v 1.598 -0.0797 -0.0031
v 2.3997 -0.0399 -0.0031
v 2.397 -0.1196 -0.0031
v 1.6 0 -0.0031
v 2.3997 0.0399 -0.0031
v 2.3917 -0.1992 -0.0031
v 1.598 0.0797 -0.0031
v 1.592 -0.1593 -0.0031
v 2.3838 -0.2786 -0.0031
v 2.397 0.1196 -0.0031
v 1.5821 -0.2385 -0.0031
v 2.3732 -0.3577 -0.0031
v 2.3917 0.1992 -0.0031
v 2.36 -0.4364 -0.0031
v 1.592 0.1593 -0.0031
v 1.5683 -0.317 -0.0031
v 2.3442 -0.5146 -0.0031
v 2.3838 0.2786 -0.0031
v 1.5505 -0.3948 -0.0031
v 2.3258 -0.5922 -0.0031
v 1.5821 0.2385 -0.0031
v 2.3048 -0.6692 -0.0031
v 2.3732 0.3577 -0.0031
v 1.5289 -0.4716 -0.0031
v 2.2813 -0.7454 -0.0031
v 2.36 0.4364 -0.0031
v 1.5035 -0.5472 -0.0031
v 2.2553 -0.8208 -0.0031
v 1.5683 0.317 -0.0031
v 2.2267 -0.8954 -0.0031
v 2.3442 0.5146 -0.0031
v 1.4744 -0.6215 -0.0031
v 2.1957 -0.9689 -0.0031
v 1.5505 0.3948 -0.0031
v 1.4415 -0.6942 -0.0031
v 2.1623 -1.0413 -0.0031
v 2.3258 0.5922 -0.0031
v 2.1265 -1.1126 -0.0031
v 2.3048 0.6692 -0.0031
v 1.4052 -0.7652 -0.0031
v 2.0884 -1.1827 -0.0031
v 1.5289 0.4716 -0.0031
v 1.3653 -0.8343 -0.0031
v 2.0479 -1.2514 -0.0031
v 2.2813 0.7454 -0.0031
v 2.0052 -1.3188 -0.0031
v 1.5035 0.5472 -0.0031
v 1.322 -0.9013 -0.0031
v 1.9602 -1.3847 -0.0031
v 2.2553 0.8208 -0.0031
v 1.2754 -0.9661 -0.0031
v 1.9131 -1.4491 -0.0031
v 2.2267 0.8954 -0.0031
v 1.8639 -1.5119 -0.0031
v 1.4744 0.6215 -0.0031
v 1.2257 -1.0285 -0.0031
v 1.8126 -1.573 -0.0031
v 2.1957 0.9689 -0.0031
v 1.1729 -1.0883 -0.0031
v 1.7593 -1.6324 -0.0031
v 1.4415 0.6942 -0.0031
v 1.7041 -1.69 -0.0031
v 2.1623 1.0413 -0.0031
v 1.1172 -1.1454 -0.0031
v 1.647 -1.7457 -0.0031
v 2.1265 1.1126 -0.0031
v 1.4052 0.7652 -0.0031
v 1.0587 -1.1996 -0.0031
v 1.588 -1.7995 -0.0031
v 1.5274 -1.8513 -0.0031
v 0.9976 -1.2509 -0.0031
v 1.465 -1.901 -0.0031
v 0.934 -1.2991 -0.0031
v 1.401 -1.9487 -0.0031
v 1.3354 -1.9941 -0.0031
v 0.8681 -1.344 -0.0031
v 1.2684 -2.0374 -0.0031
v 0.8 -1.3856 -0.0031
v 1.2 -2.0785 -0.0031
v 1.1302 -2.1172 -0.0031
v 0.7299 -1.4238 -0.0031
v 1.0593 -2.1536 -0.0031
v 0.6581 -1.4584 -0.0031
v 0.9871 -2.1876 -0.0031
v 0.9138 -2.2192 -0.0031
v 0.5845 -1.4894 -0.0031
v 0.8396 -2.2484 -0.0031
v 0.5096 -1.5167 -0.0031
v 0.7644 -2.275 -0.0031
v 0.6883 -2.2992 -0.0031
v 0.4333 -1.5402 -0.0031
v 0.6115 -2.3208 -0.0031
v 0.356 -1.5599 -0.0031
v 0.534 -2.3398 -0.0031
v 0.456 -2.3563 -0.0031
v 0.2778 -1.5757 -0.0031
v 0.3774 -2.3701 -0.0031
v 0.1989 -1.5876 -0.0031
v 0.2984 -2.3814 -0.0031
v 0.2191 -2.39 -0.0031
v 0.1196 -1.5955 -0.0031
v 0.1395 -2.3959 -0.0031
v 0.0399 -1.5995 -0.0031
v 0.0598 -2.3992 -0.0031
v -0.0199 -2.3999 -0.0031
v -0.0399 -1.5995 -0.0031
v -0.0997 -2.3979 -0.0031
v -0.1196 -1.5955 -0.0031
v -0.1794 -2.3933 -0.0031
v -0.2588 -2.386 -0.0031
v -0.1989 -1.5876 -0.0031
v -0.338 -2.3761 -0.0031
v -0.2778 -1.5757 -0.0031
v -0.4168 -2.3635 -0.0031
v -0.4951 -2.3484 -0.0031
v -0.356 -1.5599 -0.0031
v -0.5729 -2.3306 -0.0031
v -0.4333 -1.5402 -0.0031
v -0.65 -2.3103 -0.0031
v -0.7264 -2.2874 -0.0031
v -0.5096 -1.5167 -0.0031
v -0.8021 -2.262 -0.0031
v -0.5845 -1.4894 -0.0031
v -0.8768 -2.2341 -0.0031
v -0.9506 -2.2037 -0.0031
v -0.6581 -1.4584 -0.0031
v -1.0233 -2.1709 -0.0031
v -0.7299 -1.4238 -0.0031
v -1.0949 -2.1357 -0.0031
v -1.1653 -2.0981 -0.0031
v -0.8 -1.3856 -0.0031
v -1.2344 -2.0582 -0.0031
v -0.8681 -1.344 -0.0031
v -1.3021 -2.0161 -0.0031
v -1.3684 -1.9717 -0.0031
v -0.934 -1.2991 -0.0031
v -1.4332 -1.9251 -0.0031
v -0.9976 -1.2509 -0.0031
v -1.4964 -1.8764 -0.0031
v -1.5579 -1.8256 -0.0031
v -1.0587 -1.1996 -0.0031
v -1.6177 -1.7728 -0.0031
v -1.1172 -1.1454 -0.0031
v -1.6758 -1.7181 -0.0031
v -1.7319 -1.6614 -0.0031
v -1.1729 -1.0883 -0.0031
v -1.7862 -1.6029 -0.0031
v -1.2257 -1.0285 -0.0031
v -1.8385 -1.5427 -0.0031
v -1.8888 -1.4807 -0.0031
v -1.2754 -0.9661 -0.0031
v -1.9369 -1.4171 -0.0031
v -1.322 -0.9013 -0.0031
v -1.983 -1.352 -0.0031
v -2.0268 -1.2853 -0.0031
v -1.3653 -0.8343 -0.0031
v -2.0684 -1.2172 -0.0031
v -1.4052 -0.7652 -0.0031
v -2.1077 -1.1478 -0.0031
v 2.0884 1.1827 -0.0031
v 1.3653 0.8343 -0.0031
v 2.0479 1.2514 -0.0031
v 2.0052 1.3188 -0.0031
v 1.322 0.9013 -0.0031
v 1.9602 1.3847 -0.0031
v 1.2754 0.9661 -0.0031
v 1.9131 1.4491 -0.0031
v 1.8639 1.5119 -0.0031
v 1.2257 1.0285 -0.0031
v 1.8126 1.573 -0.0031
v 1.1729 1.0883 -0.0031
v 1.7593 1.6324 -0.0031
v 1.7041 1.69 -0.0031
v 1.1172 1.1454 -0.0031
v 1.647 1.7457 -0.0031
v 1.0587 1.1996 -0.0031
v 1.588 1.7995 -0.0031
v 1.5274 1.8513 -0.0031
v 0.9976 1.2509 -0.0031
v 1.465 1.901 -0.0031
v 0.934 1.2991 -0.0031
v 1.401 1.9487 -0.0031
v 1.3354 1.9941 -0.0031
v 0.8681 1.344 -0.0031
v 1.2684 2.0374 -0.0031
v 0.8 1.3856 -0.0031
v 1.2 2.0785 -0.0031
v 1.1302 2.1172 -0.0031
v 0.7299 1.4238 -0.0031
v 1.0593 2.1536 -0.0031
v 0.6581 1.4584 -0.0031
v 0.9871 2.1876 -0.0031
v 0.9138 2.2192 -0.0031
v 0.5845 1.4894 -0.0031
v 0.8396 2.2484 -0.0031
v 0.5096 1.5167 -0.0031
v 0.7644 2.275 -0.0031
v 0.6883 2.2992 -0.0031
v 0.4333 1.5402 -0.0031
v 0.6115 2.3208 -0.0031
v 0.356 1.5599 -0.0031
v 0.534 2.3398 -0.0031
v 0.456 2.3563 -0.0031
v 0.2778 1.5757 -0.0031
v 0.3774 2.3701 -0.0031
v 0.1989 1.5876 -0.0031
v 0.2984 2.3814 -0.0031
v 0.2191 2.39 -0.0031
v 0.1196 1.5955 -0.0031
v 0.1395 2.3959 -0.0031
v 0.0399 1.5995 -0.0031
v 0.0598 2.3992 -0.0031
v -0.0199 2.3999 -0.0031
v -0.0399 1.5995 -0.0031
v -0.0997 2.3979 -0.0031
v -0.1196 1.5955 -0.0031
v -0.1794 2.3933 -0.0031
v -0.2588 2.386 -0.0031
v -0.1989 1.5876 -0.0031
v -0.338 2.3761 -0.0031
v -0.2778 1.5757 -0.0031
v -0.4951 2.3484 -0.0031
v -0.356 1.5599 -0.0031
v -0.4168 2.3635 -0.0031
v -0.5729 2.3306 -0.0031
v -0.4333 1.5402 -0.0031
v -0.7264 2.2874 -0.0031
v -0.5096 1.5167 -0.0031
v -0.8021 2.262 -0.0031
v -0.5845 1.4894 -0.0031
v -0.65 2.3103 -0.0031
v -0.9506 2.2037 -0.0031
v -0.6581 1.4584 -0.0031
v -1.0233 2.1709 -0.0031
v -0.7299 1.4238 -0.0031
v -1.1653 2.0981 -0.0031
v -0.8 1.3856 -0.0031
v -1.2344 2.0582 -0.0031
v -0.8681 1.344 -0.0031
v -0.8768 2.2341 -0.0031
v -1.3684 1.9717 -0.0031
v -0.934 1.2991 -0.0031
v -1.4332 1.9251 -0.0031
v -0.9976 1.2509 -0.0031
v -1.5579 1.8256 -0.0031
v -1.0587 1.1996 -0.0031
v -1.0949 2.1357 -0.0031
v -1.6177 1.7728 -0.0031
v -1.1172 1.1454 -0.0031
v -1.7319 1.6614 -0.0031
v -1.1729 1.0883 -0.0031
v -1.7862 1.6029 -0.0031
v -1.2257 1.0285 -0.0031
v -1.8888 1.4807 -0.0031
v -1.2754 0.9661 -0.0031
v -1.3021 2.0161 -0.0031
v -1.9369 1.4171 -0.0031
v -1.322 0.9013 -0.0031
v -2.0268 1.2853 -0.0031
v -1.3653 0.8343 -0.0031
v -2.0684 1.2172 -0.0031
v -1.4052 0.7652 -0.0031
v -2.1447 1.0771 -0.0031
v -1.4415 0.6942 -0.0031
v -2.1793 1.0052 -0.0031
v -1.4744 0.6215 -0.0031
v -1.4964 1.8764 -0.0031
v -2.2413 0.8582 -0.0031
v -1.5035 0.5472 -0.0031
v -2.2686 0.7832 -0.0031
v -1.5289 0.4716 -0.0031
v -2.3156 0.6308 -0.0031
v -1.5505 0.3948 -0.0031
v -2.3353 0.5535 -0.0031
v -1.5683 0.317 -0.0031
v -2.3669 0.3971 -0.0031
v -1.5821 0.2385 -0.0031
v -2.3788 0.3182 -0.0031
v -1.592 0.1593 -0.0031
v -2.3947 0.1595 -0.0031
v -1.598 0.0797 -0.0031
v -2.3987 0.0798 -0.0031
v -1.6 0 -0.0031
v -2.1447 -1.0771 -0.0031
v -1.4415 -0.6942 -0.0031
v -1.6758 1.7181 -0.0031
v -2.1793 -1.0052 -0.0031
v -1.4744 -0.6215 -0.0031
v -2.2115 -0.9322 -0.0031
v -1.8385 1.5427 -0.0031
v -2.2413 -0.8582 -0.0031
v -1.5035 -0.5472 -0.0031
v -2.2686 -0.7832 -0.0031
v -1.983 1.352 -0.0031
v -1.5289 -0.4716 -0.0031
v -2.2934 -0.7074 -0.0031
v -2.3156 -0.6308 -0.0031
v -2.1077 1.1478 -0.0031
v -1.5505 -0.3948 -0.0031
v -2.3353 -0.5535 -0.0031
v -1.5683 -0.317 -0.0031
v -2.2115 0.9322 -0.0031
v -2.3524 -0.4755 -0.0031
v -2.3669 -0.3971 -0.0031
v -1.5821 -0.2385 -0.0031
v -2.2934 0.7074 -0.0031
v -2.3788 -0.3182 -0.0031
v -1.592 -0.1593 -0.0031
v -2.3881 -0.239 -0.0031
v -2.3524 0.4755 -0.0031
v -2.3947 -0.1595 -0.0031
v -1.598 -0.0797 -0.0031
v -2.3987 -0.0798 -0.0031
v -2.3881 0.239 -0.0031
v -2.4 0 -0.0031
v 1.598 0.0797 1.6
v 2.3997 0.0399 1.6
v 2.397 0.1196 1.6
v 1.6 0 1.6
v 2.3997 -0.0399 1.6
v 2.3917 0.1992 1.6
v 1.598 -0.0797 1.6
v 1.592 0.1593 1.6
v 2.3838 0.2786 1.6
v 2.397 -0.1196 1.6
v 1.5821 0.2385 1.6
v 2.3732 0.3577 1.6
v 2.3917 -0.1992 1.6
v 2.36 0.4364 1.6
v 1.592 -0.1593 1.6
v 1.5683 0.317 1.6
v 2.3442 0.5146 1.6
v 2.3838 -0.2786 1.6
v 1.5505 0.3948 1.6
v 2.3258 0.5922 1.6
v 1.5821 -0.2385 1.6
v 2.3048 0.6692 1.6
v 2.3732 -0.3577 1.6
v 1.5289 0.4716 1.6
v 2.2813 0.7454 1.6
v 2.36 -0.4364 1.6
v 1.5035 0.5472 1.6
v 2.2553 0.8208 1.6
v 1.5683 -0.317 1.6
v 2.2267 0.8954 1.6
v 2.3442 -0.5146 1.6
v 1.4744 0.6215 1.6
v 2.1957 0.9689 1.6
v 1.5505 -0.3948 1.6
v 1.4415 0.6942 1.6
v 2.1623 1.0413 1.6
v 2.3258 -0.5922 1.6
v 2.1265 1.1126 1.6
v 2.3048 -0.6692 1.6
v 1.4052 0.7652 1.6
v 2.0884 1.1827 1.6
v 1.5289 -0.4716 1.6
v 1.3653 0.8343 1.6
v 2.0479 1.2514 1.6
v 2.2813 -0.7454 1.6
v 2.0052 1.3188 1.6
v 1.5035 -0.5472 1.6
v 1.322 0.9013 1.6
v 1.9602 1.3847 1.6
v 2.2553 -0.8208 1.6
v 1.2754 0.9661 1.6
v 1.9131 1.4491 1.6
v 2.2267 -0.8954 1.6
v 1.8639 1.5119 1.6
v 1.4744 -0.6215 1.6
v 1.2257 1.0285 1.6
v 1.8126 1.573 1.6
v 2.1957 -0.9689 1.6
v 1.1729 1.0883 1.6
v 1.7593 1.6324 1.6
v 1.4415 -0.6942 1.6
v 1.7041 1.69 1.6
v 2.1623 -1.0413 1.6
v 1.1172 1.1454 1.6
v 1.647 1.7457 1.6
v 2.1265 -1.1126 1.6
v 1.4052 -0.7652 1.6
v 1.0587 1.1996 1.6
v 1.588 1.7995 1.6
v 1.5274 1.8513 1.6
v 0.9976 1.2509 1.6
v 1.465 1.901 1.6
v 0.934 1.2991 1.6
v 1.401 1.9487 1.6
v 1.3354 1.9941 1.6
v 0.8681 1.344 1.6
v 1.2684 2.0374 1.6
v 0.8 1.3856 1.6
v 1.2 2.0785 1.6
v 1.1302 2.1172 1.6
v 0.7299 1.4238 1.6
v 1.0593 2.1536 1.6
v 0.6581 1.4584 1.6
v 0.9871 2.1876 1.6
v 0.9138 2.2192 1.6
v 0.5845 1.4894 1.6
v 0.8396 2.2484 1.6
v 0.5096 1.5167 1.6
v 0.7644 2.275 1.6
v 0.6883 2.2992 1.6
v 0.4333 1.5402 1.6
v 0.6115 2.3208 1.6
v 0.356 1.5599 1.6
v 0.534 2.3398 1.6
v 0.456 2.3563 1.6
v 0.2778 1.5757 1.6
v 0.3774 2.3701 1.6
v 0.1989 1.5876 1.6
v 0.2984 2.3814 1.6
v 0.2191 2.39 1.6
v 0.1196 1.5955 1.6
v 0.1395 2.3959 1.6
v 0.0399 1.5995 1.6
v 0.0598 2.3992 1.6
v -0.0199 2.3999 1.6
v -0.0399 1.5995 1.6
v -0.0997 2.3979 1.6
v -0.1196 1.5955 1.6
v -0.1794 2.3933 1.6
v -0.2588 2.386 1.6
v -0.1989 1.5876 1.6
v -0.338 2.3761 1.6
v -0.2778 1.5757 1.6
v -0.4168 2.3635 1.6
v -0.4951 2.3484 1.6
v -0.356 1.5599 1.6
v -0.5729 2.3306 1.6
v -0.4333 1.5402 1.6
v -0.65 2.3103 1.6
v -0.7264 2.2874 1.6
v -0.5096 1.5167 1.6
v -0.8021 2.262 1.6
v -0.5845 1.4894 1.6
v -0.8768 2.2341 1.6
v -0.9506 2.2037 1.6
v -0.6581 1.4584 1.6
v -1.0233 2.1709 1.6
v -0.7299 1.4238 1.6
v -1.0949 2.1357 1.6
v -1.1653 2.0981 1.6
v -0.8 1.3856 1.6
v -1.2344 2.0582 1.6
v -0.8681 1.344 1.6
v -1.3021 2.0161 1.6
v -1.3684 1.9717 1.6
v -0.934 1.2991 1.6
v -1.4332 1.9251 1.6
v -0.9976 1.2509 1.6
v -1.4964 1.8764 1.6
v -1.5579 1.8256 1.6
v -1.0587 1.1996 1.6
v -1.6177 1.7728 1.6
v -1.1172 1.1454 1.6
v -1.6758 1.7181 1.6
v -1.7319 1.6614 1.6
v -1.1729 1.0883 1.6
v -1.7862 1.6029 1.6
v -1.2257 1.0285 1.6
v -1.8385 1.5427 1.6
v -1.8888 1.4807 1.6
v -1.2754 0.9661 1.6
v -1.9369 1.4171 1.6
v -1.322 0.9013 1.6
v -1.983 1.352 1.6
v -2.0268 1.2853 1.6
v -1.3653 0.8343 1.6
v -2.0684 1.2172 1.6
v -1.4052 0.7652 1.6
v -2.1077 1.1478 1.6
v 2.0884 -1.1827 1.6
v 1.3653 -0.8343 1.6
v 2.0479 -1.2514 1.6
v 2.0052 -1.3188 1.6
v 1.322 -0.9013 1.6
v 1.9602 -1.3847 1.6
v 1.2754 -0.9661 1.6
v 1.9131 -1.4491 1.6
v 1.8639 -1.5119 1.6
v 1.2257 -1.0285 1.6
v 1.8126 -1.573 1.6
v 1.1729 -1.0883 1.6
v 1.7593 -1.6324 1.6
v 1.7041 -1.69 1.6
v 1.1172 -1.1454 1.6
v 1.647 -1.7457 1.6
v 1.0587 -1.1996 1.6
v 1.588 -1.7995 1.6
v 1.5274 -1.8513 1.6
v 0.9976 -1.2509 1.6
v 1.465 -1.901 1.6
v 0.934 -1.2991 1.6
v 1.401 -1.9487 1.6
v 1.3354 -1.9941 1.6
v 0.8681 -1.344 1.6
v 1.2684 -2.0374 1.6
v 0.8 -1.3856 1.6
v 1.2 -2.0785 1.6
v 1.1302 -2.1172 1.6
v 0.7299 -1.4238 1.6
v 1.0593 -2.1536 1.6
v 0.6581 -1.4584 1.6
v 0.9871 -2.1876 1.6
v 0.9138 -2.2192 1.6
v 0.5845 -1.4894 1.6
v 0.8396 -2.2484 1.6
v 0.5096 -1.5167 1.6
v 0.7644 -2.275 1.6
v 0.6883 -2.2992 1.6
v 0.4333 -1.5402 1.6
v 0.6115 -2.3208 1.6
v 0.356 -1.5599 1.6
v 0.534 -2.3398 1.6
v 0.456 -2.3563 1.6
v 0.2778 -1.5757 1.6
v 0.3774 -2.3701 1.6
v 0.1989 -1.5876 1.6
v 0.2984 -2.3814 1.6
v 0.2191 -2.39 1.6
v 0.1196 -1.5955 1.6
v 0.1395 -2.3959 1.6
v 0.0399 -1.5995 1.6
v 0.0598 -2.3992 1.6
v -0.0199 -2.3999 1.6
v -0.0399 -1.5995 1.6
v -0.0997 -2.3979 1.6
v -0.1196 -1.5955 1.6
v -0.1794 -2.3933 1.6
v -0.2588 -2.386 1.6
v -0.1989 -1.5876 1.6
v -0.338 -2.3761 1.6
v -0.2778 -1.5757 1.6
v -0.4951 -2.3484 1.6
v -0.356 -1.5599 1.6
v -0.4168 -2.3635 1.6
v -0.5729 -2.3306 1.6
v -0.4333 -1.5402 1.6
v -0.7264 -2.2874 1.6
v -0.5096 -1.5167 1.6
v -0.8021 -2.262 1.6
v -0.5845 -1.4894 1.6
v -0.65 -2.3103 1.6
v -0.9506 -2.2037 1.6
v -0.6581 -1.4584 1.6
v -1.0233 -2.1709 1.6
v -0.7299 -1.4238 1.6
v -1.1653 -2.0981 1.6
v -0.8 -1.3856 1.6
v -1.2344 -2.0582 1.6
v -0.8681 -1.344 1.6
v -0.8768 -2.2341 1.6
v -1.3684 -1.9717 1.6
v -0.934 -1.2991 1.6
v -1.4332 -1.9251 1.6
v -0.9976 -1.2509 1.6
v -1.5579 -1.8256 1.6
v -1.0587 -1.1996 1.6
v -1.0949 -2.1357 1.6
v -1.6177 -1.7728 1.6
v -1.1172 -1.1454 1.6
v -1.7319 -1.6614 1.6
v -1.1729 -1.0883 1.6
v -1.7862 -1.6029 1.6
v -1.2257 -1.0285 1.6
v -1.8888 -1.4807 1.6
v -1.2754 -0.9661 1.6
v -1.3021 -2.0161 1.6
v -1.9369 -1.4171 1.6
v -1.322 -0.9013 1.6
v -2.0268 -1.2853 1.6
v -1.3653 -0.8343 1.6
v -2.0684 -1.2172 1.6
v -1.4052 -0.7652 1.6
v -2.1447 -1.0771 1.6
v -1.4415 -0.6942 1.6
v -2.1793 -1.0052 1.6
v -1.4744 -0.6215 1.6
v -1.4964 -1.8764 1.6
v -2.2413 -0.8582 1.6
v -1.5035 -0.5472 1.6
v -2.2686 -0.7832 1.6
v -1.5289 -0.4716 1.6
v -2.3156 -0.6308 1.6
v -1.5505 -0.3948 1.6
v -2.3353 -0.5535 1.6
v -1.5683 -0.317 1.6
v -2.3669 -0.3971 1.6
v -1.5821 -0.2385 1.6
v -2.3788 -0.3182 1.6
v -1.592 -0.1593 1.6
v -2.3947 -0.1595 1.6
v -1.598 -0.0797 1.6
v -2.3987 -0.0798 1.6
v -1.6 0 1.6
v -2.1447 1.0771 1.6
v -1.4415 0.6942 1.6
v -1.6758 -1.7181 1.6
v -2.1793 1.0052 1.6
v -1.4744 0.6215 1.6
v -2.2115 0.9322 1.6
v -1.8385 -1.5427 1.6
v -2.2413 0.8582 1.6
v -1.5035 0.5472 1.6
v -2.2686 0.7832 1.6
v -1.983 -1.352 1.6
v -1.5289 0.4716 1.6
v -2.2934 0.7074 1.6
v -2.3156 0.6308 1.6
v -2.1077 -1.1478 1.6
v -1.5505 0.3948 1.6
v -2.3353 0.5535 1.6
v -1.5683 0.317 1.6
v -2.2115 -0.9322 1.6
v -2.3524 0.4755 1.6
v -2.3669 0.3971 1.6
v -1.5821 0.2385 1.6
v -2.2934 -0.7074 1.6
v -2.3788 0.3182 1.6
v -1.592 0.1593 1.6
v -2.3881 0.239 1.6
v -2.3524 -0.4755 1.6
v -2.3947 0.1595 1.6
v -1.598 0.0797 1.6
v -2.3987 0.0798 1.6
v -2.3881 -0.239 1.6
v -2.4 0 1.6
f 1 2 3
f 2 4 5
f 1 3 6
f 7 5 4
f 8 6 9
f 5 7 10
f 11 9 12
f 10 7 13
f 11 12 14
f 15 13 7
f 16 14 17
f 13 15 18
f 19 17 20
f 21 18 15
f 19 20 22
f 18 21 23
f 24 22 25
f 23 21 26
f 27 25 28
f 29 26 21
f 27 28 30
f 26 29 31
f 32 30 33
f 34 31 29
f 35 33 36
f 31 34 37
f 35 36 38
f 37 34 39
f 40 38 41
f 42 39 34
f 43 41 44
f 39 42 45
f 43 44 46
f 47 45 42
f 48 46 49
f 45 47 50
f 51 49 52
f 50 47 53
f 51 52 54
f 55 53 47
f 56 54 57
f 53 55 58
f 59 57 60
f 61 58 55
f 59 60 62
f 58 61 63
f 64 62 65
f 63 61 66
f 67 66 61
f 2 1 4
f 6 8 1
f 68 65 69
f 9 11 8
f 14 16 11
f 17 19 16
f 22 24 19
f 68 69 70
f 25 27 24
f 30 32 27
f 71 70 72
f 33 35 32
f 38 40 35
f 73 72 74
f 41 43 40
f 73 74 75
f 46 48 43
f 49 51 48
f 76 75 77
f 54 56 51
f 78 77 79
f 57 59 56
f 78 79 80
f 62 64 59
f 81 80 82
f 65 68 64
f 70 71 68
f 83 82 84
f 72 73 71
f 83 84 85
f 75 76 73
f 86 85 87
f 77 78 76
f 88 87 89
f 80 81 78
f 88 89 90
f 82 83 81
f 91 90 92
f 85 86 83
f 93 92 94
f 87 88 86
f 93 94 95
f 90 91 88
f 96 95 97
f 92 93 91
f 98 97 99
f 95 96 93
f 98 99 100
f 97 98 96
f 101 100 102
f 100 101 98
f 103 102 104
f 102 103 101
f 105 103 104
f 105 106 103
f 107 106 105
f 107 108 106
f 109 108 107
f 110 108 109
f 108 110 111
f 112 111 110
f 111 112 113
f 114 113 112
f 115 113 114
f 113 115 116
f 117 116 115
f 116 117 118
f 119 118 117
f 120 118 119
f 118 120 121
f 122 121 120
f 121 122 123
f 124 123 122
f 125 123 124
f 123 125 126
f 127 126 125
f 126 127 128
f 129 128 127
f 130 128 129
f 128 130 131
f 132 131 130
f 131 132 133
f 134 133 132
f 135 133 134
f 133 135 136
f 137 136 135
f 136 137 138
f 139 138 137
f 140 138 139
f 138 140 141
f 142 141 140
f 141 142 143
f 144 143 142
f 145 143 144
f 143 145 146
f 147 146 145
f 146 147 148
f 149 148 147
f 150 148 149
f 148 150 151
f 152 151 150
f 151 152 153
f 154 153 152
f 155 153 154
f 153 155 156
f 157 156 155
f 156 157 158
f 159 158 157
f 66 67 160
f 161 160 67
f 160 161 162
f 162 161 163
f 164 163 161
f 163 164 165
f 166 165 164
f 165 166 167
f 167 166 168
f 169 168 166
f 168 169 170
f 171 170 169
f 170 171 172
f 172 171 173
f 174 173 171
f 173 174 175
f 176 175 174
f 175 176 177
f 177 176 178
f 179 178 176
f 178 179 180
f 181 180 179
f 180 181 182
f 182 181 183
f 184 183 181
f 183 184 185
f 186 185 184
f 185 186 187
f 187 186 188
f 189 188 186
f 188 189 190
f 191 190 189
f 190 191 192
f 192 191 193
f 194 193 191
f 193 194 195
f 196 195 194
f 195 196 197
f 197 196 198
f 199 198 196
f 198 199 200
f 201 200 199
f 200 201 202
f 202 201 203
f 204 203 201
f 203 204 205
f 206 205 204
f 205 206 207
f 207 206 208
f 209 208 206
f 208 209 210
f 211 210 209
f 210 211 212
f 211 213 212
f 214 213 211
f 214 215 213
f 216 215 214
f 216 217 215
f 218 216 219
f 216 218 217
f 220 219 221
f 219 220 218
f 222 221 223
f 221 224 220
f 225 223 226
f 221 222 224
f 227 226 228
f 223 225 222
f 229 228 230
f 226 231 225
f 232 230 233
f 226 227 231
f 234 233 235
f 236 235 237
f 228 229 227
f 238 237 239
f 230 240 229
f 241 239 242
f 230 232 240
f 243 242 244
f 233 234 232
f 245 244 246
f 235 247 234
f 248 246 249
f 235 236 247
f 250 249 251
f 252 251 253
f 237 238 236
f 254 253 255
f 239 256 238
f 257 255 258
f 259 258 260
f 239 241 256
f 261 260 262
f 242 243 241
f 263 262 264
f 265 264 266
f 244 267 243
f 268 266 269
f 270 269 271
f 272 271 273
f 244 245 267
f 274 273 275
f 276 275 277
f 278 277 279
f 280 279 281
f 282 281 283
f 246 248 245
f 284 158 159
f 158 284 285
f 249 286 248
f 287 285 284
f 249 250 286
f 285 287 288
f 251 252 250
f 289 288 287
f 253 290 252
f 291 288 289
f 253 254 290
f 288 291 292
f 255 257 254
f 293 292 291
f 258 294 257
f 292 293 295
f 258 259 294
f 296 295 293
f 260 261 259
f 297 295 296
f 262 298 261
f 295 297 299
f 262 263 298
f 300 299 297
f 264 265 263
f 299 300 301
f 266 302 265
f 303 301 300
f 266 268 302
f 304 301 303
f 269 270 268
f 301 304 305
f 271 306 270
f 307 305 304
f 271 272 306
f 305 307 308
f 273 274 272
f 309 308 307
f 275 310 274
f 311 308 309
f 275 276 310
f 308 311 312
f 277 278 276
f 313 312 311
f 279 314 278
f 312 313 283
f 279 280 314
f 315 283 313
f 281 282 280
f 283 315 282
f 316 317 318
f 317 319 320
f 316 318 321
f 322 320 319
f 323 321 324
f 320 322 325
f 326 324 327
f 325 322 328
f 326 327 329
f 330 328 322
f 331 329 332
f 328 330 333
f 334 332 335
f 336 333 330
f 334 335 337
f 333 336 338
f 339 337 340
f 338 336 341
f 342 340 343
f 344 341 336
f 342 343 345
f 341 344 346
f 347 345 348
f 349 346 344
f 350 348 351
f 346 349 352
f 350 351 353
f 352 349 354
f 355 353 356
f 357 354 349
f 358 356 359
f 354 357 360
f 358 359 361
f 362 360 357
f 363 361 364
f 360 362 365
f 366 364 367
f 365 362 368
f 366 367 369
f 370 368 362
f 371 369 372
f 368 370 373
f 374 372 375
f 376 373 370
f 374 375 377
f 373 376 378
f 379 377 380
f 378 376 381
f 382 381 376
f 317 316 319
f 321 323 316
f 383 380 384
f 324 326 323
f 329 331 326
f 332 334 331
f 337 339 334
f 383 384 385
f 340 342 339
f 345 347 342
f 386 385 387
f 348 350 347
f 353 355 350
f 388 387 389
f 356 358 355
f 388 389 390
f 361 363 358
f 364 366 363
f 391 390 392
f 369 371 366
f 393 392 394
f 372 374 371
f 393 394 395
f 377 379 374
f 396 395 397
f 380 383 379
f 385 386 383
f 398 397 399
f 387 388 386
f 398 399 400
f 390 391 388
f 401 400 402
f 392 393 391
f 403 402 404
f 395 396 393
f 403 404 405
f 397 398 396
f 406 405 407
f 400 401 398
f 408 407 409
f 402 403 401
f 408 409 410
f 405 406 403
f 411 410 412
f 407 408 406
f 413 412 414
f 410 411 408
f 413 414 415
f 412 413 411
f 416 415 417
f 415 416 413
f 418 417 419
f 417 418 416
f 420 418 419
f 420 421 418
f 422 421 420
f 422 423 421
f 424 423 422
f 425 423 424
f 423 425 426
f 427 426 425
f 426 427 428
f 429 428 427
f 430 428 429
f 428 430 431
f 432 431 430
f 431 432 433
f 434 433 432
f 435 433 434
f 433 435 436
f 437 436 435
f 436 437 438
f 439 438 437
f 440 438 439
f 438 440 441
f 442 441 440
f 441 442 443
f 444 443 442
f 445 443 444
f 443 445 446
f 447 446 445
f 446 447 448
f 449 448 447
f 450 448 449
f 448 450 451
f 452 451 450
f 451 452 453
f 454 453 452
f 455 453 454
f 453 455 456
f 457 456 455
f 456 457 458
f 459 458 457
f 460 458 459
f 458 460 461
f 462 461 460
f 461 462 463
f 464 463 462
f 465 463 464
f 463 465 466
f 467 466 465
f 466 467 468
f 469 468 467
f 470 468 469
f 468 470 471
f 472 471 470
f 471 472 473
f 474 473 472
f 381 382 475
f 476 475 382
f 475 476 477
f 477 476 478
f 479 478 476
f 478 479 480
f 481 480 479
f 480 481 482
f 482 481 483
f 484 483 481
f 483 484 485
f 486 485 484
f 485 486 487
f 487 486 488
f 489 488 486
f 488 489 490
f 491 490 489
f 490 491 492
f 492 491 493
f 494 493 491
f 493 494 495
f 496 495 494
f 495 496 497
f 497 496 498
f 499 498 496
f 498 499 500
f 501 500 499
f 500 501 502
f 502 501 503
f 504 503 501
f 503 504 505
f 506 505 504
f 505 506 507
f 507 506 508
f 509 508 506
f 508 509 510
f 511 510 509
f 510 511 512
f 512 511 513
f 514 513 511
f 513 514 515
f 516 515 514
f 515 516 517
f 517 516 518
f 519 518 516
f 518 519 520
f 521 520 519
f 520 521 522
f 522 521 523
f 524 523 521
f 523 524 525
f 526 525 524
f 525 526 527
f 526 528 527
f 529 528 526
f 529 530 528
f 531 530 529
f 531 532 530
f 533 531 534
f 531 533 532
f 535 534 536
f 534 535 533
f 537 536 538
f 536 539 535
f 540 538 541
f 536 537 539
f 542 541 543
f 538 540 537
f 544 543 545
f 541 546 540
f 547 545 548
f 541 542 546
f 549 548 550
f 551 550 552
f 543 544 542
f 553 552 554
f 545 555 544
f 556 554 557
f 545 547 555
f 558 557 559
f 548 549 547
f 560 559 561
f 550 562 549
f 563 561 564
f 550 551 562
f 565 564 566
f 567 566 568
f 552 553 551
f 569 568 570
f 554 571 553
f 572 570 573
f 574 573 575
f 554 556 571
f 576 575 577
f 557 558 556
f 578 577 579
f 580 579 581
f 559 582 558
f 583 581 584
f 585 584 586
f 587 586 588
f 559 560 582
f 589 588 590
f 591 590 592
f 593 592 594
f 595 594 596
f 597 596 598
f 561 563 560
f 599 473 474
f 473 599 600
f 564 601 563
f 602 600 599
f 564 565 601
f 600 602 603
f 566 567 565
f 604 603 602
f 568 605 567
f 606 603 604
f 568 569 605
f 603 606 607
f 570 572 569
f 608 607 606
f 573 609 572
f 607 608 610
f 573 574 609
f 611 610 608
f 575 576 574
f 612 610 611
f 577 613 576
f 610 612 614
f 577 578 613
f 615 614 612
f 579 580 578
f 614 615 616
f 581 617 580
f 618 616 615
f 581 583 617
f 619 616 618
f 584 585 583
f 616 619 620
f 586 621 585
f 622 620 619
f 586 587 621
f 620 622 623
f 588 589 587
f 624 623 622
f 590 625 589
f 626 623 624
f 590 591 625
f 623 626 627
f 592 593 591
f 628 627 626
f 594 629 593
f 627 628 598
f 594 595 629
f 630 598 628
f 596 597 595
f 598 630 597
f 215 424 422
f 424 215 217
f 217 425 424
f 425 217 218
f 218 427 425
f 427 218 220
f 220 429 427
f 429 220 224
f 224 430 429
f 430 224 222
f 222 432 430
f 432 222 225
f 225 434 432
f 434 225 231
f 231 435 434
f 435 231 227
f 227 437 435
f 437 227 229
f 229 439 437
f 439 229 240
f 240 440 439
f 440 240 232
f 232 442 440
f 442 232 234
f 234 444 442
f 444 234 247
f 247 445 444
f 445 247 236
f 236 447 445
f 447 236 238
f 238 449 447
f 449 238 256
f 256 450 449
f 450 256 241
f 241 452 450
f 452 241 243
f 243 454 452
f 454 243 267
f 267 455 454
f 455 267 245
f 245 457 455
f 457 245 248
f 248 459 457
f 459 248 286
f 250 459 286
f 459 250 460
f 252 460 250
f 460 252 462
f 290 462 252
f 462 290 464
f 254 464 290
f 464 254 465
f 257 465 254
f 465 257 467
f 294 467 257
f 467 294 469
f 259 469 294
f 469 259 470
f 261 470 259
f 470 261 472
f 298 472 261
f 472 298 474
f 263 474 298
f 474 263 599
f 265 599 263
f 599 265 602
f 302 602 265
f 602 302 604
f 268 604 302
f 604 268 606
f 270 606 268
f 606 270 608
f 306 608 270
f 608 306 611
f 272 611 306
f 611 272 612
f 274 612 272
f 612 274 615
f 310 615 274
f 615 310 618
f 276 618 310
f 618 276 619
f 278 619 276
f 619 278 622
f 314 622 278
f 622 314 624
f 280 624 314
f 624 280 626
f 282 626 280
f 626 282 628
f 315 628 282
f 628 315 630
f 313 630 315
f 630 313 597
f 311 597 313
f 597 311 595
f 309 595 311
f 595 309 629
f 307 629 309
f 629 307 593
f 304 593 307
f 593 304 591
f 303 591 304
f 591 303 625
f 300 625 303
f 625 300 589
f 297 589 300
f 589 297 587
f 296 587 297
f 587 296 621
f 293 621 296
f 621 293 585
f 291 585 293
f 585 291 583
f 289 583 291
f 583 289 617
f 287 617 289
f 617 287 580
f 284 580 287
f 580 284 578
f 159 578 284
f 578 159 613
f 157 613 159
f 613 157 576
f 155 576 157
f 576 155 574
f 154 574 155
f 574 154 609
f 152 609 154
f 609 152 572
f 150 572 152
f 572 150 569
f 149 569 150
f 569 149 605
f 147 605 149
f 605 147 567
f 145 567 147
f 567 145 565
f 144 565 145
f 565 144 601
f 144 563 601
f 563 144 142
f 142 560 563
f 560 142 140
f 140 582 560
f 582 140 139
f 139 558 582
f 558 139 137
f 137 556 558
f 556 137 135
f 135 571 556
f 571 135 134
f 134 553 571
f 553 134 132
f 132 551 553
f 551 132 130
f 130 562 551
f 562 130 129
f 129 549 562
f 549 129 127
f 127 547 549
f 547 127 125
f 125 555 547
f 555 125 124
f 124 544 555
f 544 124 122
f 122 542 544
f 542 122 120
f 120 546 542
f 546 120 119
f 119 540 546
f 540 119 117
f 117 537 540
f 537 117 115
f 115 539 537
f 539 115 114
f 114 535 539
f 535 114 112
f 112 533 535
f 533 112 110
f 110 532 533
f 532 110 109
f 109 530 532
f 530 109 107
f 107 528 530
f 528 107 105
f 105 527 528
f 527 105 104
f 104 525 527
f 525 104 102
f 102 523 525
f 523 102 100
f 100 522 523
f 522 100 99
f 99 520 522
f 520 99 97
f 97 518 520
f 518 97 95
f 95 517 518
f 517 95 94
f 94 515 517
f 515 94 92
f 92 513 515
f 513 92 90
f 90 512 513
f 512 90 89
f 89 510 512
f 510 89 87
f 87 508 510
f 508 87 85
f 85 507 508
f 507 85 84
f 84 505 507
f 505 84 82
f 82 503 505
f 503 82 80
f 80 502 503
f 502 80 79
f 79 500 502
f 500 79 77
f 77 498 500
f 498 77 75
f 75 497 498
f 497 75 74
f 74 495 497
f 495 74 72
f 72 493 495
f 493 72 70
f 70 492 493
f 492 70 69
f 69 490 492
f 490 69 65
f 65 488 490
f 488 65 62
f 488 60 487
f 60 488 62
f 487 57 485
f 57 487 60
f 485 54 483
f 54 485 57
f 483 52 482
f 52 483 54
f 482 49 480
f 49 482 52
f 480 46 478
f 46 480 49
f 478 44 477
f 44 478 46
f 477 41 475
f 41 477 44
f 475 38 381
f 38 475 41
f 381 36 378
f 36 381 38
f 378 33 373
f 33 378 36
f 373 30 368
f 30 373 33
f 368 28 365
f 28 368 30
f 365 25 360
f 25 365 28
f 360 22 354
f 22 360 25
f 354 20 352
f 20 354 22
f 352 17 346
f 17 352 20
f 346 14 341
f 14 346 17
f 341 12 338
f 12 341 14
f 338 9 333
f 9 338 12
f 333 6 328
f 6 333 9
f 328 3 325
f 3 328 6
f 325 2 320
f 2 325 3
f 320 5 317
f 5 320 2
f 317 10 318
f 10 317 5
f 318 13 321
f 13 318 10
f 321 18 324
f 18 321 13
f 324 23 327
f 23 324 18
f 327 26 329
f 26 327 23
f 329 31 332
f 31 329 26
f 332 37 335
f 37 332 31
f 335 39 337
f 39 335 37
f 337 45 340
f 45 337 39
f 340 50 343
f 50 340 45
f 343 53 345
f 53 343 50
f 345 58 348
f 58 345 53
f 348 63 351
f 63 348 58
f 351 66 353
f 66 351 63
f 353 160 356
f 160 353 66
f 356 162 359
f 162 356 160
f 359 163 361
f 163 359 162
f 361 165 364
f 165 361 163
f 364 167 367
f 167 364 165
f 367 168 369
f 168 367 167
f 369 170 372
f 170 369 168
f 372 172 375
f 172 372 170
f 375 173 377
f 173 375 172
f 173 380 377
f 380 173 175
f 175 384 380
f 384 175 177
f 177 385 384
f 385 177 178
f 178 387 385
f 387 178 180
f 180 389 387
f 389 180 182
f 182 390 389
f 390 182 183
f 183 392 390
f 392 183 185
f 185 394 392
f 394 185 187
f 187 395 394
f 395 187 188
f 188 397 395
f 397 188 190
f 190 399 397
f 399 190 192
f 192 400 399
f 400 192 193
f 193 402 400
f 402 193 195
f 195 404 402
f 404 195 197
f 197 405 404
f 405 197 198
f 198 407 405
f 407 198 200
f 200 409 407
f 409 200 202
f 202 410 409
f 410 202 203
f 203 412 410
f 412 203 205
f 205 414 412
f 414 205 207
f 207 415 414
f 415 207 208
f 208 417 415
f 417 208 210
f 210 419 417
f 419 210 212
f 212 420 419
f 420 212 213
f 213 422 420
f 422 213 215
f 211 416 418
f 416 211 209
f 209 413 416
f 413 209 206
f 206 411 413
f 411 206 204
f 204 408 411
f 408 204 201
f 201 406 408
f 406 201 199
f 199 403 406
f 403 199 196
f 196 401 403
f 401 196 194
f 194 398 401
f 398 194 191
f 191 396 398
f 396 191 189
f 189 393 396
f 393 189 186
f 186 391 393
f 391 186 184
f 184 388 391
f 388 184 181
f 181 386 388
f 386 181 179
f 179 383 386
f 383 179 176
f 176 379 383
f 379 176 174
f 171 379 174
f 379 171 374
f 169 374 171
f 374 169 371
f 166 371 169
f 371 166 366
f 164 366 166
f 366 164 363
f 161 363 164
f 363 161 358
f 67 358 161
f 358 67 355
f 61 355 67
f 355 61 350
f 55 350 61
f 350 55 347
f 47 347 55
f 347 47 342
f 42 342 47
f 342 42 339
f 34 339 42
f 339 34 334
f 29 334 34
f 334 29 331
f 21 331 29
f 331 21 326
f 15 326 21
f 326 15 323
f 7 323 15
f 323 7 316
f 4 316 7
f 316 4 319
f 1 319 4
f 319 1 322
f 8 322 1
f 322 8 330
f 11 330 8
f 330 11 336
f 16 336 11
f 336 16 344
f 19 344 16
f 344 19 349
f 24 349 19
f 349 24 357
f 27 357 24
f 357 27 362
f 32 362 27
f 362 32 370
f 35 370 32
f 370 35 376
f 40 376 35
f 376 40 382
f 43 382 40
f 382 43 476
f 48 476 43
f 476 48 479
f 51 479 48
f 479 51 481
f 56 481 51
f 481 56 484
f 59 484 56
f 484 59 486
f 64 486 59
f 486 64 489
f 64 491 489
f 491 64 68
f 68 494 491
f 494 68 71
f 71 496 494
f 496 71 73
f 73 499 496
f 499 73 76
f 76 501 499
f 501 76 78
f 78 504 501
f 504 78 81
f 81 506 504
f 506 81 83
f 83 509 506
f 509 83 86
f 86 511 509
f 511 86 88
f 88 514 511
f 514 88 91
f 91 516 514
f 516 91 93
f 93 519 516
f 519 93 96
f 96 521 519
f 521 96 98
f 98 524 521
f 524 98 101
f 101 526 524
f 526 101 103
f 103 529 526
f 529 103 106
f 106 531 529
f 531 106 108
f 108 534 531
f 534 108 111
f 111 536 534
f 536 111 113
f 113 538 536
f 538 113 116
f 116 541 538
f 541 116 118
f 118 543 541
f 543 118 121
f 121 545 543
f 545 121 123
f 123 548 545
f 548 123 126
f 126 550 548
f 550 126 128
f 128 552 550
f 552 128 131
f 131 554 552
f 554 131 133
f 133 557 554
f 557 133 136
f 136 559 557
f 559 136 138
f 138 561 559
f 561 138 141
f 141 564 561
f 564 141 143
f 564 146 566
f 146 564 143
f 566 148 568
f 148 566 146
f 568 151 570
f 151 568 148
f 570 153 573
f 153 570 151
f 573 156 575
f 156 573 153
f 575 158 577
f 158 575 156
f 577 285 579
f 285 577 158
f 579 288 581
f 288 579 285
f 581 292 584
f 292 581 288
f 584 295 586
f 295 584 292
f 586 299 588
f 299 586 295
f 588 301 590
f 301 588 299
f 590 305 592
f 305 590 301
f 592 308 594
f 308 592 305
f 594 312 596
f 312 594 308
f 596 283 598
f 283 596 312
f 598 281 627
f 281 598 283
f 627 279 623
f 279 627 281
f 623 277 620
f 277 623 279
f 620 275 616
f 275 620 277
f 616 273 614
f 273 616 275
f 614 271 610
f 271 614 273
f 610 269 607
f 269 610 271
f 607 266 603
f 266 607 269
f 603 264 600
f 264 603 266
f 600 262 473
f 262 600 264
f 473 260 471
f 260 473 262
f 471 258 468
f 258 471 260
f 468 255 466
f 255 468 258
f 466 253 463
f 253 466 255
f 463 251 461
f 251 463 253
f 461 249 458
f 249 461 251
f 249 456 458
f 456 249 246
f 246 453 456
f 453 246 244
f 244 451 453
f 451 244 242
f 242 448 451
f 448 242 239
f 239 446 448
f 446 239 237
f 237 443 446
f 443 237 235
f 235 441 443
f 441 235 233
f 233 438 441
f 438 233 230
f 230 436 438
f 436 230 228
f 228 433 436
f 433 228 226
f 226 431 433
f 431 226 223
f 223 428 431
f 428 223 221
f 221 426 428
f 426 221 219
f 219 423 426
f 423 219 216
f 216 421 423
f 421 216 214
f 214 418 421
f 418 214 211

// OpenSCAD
use <../lib.scad>
use <../p/1-8cyli.scad>
use <s/3626cpaps01.scad>
use <s/3626cs02.scad>
use <../p/t08o6250.scad>
$fa=1; $fs=0.2;
function ldraw_lib__3626cpap(realsolid=false) = [
// 0 Minifig Head Wolf with Yellow Eyes, Black Scars, Fangs, Closed / Open Mouth 2-Sided Pattern
// 0 Name: 3626cpap.dat
// 0 Author: Philippe Hurbain [Philo]
// 0 !LDRAW_ORG Part UPDATE 2022-01
// 0 !LICENSE Licensed under CC BY 2.0 and CC BY 4.0 : see CAreadme.txt
// 
// 0 BFC CERTIFY CCW
  [0,"BFC","CERTIFY"],
  [0,"BFC","CCW"],
// 
// 0 !KEYWORDS Chima, Worriz
// 
// 0 !HISTORY 2022-01-14 [PTadmin] Official Update 2022-01
// 
// 
// 1 16 0 0 0 1 0 0 0 1 0 0 0 1 s\3626cs02.dat
  [1,16,0,0,0,1,0,0,0,1,0,0,0,1, ldraw_lib__s__3626cs02(realsolid)],
// 1 16 0 17 0 7.39104 0 3.06147 0 6.4 0 3.06147 0 -7.39104 t08o6250.dat
  [1,16,0,17,0,7.39104,0,3.06147,0,6.4,0,3.06147,0,-7.39104, ldraw_lib__t08o6250(realsolid)],
// 1 16 0 17 0 -7.39104 0 -3.06147 0 6.4 0 3.06147 0 -7.39104 t08o6250.dat
  [1,16,0,17,0,-7.39104,0,-3.06147,0,6.4,0,3.06147,0,-7.39104, ldraw_lib__t08o6250(realsolid)],
// 1 16 0 4 0 7.39104 0 3.06147 0 -6.4 0 3.06147 0 -7.39104 t08o6250.dat
  [1,16,0,4,0,7.39104,0,3.06147,0,-6.4,0,3.06147,0,-7.39104, ldraw_lib__t08o6250(realsolid)],
// 1 16 0 4 0 -7.39104 0 -3.06147 0 -6.4 0 3.06147 0 -7.39104 t08o6250.dat
  [1,16,0,4,0,-7.39104,0,-3.06147,0,-6.4,0,3.06147,0,-7.39104, ldraw_lib__t08o6250(realsolid)],
// 1 16 0 4 0 12.0104 0 4.97488 0 13 0 4.97488 0 -12.0104 1-8cyli.dat
  [1,16,0,4,0,12.0104,0,4.97488,0,13,0,4.97488,0,-12.0104, ldraw_lib__1_8cyli(realsolid)],
// 1 16 0 4 0 -12.0104 0 -4.97488 0 13 0 4.97488 0 -12.0104 1-8cyli.dat
  [1,16,0,4,0,-12.0104,0,-4.97488,0,13,0,4.97488,0,-12.0104, ldraw_lib__1_8cyli(realsolid)],
// 1 16 0 0 0 1 0 0 0 1 0 0 0 1 s\3626cpaps01.dat
  [1,16,0,0,0,1,0,0,0,1,0,0,0,1, ldraw_lib__s__3626cpaps01(realsolid)],
// 1 16 0 0 0 -1 0 0 0 1 0 0 0 1 s\3626cpaps01.dat
  [1,16,0,0,0,-1,0,0,0,1,0,0,0,1, ldraw_lib__s__3626cpaps01(realsolid)],
];
module ldraw_lib__3626cpap(step=0, col=false, unit=2/5, alt=false, line=0.2, solid=!$preview)
    makepoly(ldraw_lib__3626cpap(solid), step=step, col=col, unit=unit, alt=alt, line=line, solid=solid);
ldraw_lib__3626cpap(line=0.2);
